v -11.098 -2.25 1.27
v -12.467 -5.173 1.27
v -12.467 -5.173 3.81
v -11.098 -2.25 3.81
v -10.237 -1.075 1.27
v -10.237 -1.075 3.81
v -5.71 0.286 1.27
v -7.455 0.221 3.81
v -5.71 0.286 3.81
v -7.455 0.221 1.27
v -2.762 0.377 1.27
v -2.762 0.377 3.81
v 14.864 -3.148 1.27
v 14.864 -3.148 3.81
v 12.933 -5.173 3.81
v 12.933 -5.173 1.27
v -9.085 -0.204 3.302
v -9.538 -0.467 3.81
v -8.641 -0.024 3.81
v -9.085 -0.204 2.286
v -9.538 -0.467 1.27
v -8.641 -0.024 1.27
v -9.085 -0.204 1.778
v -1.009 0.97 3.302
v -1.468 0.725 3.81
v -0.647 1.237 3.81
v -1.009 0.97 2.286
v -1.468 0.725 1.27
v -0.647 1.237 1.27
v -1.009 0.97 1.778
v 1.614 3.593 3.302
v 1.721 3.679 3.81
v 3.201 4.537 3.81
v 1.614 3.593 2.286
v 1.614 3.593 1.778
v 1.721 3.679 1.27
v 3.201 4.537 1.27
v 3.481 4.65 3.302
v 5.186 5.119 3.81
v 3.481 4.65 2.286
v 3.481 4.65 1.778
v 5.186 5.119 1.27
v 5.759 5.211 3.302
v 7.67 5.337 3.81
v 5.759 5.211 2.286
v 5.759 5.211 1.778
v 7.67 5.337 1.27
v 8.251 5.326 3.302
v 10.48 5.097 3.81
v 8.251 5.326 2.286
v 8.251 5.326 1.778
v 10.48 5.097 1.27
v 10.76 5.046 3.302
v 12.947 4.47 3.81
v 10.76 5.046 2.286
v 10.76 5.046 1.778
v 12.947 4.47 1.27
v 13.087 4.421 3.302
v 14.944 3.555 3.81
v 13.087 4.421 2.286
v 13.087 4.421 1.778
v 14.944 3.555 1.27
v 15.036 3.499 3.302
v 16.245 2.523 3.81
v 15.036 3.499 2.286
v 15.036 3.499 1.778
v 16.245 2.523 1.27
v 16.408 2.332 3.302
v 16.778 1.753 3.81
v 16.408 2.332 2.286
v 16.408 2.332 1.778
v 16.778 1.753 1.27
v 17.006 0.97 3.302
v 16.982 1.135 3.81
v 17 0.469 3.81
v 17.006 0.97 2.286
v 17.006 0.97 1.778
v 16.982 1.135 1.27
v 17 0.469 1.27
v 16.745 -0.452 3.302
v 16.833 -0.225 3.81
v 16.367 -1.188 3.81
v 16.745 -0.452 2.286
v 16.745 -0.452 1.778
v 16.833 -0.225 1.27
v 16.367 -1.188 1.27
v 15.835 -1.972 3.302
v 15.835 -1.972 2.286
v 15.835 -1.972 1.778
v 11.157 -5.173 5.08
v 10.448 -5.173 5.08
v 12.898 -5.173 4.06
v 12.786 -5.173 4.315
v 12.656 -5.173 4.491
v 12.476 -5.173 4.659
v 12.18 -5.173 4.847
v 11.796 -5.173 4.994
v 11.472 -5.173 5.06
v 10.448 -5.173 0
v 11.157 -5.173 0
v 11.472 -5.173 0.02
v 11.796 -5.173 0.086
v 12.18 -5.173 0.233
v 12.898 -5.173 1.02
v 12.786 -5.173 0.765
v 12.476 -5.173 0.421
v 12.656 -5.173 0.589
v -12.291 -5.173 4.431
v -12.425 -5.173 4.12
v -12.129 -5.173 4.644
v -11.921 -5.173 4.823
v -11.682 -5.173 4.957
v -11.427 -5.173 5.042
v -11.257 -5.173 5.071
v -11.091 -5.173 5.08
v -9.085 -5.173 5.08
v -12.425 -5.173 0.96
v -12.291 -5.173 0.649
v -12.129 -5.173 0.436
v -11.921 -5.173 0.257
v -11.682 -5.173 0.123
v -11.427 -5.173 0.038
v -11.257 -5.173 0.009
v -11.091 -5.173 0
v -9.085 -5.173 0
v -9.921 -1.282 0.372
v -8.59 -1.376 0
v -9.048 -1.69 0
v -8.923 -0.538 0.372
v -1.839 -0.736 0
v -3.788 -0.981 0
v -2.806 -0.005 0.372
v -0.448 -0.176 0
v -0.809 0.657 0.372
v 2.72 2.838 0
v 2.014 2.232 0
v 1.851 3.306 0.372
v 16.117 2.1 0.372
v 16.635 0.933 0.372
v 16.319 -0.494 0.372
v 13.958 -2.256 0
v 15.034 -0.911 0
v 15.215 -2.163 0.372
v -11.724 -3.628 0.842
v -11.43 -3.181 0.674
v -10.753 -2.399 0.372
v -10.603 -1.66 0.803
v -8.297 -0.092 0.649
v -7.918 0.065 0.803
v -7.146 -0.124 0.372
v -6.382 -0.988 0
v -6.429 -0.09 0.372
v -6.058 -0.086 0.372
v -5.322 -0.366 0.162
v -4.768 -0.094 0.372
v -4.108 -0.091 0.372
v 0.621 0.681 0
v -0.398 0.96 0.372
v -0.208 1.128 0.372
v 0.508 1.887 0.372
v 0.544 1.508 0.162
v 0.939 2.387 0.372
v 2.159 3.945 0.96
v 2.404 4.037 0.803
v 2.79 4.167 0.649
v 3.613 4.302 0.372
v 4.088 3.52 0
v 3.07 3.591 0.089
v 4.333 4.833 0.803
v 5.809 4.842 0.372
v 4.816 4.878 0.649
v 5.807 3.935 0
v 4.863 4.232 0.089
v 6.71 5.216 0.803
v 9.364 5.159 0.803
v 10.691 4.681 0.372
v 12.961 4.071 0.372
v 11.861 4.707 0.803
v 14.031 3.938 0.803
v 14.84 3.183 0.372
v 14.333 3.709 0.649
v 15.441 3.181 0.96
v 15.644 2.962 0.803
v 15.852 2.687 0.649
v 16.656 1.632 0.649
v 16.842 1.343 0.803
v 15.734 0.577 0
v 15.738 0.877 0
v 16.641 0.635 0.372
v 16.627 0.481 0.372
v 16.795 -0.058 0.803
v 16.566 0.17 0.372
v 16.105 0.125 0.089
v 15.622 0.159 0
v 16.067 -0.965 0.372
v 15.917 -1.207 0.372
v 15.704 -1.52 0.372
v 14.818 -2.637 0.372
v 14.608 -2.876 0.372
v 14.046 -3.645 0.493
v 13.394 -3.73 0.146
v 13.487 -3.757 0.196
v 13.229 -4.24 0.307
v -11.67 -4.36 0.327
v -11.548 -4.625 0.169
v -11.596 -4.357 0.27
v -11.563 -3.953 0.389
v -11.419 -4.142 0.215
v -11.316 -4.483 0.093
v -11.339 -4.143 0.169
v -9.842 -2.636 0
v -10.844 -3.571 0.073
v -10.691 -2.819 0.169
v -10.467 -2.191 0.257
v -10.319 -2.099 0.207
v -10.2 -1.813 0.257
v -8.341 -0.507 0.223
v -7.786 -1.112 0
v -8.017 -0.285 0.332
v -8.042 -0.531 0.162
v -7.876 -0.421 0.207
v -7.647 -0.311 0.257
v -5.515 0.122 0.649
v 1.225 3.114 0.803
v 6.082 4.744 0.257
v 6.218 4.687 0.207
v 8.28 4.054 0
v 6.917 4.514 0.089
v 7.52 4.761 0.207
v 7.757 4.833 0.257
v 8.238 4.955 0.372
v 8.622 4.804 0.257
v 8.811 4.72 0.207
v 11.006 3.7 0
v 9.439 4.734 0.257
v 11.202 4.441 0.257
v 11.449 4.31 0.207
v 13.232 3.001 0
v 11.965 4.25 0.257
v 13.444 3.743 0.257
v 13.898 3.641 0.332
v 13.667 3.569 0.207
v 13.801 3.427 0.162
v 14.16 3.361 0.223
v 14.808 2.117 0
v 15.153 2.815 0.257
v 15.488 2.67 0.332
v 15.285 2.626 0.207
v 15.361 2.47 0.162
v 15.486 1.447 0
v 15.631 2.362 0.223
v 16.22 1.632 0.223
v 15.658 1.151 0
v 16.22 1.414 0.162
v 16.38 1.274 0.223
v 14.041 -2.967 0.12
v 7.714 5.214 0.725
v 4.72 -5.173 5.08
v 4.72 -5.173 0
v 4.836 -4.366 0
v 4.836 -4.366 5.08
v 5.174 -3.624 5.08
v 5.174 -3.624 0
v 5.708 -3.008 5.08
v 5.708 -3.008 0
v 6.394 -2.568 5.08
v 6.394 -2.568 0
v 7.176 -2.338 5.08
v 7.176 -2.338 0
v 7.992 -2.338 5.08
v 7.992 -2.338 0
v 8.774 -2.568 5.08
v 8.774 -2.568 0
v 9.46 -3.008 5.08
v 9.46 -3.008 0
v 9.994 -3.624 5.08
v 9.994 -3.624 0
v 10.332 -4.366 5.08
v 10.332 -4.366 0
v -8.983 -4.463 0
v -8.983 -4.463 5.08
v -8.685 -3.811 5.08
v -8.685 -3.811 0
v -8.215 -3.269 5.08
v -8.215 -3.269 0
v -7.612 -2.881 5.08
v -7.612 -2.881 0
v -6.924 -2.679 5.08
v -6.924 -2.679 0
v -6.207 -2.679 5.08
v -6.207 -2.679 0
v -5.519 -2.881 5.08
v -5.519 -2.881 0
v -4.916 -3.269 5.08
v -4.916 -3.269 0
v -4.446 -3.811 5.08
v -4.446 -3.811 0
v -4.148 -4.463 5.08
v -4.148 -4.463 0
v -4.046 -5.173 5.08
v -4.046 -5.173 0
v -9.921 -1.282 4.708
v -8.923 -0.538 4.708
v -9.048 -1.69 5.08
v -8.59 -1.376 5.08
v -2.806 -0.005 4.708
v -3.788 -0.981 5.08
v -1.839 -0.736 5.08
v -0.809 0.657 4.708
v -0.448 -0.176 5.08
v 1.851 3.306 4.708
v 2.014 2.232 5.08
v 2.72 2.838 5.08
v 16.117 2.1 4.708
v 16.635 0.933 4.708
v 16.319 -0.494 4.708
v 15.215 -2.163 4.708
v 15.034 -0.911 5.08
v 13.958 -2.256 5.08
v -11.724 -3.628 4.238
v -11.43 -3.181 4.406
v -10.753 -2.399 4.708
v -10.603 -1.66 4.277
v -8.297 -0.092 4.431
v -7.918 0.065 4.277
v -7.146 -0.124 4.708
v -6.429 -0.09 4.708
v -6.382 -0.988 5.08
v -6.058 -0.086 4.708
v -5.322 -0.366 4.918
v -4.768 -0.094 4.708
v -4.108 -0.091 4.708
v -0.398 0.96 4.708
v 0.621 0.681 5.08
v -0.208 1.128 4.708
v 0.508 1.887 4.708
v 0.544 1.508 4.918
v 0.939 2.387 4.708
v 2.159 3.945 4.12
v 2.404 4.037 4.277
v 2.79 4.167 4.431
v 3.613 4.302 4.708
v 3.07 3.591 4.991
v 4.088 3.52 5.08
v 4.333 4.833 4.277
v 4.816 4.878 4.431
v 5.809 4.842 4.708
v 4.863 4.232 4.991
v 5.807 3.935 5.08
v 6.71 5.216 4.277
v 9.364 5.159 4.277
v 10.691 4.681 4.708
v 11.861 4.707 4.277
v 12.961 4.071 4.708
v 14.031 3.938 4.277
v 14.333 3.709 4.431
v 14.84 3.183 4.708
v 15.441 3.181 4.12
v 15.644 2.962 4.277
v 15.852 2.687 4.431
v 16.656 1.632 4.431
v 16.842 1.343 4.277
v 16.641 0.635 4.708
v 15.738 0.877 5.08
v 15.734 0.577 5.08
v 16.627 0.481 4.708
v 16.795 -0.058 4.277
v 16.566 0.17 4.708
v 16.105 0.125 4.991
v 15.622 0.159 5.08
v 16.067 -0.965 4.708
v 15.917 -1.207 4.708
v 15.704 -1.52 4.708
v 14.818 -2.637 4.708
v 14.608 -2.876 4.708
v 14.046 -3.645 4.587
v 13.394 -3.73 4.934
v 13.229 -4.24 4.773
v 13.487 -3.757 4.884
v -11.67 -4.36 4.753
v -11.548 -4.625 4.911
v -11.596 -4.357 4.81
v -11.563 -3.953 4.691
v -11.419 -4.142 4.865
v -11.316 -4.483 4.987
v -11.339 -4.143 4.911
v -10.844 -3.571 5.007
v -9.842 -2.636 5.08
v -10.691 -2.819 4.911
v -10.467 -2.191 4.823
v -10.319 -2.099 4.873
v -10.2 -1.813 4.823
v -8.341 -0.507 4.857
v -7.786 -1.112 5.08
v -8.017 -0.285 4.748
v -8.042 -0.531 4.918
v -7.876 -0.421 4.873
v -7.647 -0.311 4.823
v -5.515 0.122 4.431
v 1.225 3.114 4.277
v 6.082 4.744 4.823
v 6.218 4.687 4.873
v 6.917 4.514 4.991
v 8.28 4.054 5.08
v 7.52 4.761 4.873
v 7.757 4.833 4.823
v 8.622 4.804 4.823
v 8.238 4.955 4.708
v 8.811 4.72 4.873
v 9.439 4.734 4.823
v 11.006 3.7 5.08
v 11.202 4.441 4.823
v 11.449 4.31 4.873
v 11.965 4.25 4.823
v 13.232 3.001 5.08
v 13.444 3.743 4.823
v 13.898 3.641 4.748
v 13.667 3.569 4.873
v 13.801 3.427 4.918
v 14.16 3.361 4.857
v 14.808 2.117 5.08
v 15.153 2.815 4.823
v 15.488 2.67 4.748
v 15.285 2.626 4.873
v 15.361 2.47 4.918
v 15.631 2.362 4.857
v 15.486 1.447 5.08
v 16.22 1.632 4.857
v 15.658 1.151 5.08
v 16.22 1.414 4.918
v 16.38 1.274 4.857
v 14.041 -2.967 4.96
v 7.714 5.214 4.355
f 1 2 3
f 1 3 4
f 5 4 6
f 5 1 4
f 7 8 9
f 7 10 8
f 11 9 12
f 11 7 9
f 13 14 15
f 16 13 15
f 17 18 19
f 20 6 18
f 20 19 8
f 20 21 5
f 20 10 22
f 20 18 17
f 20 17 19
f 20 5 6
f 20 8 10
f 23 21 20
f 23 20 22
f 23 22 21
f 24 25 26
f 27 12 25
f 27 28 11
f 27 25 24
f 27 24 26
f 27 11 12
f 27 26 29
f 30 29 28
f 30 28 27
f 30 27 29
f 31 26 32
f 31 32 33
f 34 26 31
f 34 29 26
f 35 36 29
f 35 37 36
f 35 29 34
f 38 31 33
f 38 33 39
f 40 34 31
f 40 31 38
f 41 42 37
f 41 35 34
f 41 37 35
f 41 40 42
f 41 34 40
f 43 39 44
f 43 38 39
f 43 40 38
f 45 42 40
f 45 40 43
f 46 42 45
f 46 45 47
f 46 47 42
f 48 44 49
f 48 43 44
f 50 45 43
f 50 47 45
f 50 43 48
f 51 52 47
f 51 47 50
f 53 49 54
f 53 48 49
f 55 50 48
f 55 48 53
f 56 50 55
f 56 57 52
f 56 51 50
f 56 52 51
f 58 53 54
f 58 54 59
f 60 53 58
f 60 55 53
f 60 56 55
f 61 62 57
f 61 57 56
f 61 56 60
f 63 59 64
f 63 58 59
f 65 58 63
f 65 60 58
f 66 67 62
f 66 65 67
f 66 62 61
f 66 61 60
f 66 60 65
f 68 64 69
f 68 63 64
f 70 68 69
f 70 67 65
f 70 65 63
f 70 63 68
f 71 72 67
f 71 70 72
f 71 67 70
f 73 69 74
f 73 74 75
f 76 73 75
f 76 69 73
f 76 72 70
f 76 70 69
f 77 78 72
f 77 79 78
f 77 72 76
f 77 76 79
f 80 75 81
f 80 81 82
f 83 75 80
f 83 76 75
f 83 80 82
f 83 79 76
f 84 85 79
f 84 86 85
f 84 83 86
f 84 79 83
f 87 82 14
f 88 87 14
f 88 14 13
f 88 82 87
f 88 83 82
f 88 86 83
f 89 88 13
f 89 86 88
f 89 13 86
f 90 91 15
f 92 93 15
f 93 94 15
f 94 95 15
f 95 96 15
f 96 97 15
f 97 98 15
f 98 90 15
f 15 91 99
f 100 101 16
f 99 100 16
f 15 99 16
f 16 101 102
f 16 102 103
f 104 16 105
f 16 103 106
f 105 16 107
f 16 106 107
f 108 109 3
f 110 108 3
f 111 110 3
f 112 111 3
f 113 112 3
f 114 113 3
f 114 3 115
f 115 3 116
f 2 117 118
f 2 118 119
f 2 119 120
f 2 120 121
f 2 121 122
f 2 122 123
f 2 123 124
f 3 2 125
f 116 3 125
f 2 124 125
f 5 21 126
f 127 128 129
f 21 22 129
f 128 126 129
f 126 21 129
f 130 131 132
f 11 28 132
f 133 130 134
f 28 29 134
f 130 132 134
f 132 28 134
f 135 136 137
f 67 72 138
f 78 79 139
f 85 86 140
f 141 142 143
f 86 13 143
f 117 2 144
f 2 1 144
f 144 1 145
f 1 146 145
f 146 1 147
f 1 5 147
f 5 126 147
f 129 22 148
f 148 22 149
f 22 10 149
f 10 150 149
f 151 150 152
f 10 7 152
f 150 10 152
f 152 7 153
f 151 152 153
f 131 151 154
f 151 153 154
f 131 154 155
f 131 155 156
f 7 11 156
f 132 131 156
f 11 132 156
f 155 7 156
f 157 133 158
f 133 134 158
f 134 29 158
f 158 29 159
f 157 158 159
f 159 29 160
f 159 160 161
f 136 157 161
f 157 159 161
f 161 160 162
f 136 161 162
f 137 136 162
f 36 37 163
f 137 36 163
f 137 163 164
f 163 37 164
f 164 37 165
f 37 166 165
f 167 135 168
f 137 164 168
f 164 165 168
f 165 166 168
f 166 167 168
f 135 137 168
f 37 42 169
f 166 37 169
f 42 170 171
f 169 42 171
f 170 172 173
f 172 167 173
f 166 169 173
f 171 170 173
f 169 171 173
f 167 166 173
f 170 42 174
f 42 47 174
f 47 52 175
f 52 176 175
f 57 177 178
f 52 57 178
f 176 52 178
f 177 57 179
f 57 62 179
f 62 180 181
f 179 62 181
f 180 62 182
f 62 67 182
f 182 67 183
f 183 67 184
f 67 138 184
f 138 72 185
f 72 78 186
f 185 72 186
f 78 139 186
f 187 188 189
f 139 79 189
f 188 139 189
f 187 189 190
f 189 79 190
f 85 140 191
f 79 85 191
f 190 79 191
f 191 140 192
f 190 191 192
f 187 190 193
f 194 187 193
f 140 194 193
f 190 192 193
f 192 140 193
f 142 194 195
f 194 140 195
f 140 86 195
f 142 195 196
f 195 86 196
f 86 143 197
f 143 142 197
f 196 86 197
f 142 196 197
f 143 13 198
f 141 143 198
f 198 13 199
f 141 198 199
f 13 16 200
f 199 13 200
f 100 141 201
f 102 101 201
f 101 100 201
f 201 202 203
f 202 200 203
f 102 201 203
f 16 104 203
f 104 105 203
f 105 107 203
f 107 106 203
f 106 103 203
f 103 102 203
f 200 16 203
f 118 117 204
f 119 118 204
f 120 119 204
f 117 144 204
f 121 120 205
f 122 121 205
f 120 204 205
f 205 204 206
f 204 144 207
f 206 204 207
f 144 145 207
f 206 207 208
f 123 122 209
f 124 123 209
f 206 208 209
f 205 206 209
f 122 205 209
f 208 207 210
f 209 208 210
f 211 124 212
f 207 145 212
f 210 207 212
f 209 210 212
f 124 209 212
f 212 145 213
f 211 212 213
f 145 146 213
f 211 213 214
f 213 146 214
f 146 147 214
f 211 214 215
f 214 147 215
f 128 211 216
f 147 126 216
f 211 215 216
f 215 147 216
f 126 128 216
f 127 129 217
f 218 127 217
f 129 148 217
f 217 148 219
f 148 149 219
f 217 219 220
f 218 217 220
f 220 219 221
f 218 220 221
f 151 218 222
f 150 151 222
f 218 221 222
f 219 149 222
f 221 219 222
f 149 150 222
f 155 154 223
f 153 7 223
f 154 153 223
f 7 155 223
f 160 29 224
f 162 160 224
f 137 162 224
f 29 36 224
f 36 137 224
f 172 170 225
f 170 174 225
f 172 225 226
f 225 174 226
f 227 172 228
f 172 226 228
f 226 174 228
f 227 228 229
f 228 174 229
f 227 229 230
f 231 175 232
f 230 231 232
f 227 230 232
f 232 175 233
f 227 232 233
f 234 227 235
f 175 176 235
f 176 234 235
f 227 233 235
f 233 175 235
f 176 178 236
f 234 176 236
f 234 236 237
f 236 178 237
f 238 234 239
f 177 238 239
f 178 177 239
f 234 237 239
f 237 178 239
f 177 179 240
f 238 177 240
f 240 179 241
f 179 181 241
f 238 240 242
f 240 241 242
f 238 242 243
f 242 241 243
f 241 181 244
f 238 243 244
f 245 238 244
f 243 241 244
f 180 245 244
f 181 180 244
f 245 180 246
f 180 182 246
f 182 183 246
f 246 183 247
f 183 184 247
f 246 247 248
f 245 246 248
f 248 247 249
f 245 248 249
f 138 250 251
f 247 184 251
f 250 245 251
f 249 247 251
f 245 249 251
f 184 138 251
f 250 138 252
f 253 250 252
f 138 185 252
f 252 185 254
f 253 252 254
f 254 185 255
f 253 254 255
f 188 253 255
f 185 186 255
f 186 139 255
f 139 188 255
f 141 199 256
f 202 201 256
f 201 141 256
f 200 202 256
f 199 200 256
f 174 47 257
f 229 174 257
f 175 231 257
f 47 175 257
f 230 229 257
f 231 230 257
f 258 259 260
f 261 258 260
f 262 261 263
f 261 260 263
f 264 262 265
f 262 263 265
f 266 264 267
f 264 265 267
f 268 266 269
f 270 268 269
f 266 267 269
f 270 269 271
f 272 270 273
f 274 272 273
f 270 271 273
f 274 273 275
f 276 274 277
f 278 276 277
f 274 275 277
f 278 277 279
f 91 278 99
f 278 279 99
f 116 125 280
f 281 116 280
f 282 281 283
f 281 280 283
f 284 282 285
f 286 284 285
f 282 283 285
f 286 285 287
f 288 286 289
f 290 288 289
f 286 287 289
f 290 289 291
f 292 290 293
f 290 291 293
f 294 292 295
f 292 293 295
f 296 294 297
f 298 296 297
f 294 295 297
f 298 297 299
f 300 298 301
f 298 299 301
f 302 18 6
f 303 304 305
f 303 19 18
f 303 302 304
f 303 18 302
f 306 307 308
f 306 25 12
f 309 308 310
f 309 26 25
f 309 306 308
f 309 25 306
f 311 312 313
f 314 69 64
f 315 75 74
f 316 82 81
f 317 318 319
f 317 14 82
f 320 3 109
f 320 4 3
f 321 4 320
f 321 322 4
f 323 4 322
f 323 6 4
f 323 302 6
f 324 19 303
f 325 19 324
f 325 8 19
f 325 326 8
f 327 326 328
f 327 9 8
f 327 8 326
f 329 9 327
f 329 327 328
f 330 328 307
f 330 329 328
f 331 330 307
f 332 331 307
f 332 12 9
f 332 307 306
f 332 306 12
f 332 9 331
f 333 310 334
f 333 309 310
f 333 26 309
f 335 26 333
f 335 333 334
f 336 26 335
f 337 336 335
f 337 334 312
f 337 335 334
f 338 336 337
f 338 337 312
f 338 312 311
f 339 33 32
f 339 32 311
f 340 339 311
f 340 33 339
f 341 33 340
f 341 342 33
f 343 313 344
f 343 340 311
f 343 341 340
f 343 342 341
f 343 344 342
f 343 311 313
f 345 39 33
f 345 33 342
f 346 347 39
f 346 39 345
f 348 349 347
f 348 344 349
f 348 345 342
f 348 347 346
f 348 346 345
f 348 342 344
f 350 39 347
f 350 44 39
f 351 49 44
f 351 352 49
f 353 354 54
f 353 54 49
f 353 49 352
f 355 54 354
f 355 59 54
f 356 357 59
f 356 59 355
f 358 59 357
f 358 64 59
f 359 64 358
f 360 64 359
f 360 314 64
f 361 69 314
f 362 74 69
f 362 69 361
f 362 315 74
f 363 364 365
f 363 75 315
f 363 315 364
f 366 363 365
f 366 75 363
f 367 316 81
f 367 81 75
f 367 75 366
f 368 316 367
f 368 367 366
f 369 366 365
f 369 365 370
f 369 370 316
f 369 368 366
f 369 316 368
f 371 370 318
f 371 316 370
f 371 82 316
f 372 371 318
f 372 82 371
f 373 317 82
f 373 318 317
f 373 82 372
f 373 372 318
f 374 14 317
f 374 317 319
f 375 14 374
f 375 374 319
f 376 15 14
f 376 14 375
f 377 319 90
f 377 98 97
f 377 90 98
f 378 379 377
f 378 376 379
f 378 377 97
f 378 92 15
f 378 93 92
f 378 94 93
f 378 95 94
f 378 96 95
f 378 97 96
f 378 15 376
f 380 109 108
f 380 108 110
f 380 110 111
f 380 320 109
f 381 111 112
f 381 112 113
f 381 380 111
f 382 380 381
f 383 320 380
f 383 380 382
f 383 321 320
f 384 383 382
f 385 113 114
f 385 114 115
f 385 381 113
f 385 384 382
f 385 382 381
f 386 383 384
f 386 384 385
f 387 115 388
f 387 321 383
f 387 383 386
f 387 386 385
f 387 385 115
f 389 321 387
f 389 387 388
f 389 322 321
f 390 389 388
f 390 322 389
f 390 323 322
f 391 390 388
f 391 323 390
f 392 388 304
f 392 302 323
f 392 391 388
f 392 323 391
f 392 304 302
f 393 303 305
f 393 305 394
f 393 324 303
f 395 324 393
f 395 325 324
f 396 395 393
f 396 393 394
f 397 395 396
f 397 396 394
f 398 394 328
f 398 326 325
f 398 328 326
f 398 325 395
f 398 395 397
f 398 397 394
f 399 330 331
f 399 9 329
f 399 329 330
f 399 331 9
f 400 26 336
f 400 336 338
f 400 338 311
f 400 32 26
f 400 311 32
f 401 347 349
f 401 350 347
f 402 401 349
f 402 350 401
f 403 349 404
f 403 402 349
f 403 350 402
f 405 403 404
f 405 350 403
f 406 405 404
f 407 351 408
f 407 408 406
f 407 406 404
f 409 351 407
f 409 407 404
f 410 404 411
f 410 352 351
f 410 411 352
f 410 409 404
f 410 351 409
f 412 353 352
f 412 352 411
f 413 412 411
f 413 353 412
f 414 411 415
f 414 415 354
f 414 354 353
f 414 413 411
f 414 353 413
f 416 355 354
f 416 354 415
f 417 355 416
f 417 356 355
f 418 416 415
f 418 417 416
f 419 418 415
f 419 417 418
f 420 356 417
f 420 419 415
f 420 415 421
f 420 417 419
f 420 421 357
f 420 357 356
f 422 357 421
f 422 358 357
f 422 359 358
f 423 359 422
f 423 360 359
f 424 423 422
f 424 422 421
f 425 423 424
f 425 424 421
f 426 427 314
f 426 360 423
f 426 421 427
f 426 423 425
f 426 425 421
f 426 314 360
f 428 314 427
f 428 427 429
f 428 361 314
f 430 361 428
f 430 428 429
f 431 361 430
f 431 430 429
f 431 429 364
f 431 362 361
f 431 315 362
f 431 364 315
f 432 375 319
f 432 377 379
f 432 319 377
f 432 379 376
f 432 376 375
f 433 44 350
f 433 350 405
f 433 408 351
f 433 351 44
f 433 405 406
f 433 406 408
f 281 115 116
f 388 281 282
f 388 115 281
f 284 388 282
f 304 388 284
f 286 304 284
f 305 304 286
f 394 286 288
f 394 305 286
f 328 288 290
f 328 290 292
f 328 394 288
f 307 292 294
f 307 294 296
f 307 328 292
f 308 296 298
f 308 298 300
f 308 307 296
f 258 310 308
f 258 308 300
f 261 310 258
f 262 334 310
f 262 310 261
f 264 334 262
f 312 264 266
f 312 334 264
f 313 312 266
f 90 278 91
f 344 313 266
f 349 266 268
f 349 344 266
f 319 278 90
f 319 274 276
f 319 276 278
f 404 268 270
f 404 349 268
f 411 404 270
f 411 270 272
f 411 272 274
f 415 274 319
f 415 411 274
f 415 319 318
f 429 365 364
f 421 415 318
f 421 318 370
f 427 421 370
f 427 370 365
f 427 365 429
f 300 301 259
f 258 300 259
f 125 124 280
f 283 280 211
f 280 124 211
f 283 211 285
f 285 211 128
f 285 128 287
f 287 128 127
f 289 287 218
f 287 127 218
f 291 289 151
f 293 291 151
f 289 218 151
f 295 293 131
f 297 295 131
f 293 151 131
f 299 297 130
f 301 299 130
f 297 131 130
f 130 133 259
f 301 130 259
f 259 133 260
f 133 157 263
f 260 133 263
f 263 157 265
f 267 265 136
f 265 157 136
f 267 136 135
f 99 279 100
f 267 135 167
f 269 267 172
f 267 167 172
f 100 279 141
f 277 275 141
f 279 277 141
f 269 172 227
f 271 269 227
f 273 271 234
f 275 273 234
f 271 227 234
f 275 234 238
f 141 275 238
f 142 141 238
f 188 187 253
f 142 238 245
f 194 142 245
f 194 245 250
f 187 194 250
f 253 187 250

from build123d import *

# Parameters (mm, degrees)
BOSS_EXTRUDE1_DEPTH = 5.08
FILLET5_R           = 1.27
FILLET6_R           = 1.27


with BuildPart() as part:
    # Sketch1 → Boss-Extrude1 (new body)
    with BuildSketch(Plane.XY):
        with BuildLine():
            Line((-12.466748379, -5.173079569), (-9.084683162, -5.173079569))
            ThreePointArc((-9.084683162, -5.173079569), (-6.565389684, -2.653786091), (-4.046096205, -5.173079569))
            Line((-4.046096205, -5.173079569), (4.719664664, -5.173079569))
            ThreePointArc((4.719664664, -5.173079569), (7.584066838, -2.308677395), (10.448469012, -5.173079569))
            Line((10.448469012, -5.173079569), (12.933251621, -5.173079569))
            add(Edge.make_bspline(
                [(-12.466748379, -5.173079569), (-11.602609758, -3.088767253), (-9.565389759, 1.825030872), (-1.457469592, -0.974797564), (3.313594973, 7.662485597), (21.694466919, 3.734941187), (15.060531025, -3.010154856), (12.933251621, -5.173079569)],
                knots=[0, 0, 0, 0, 0.147100974, 0.346792793, 0.437561542, 0.819644964, 1, 1, 1, 1], degree=3))
        make_face()
    extrude(amount=BOSS_EXTRUDE1_DEPTH)

    # Fillet5
    fillet5_edges = [part.edges().sort_by_distance(p)[0] for p in [
        (4.701887828, 5.017984199, 5.08),
    ]]
    fillet(fillet5_edges, radius=FILLET5_R)

    # Fillet6
    fillet6_edges = [part.edges().sort_by_distance(p)[0] for p in [
        (4.701887828, 5.017984199, 0),
    ]]
    fillet(fillet6_edges, radius=FILLET6_R)


solid = part.part
